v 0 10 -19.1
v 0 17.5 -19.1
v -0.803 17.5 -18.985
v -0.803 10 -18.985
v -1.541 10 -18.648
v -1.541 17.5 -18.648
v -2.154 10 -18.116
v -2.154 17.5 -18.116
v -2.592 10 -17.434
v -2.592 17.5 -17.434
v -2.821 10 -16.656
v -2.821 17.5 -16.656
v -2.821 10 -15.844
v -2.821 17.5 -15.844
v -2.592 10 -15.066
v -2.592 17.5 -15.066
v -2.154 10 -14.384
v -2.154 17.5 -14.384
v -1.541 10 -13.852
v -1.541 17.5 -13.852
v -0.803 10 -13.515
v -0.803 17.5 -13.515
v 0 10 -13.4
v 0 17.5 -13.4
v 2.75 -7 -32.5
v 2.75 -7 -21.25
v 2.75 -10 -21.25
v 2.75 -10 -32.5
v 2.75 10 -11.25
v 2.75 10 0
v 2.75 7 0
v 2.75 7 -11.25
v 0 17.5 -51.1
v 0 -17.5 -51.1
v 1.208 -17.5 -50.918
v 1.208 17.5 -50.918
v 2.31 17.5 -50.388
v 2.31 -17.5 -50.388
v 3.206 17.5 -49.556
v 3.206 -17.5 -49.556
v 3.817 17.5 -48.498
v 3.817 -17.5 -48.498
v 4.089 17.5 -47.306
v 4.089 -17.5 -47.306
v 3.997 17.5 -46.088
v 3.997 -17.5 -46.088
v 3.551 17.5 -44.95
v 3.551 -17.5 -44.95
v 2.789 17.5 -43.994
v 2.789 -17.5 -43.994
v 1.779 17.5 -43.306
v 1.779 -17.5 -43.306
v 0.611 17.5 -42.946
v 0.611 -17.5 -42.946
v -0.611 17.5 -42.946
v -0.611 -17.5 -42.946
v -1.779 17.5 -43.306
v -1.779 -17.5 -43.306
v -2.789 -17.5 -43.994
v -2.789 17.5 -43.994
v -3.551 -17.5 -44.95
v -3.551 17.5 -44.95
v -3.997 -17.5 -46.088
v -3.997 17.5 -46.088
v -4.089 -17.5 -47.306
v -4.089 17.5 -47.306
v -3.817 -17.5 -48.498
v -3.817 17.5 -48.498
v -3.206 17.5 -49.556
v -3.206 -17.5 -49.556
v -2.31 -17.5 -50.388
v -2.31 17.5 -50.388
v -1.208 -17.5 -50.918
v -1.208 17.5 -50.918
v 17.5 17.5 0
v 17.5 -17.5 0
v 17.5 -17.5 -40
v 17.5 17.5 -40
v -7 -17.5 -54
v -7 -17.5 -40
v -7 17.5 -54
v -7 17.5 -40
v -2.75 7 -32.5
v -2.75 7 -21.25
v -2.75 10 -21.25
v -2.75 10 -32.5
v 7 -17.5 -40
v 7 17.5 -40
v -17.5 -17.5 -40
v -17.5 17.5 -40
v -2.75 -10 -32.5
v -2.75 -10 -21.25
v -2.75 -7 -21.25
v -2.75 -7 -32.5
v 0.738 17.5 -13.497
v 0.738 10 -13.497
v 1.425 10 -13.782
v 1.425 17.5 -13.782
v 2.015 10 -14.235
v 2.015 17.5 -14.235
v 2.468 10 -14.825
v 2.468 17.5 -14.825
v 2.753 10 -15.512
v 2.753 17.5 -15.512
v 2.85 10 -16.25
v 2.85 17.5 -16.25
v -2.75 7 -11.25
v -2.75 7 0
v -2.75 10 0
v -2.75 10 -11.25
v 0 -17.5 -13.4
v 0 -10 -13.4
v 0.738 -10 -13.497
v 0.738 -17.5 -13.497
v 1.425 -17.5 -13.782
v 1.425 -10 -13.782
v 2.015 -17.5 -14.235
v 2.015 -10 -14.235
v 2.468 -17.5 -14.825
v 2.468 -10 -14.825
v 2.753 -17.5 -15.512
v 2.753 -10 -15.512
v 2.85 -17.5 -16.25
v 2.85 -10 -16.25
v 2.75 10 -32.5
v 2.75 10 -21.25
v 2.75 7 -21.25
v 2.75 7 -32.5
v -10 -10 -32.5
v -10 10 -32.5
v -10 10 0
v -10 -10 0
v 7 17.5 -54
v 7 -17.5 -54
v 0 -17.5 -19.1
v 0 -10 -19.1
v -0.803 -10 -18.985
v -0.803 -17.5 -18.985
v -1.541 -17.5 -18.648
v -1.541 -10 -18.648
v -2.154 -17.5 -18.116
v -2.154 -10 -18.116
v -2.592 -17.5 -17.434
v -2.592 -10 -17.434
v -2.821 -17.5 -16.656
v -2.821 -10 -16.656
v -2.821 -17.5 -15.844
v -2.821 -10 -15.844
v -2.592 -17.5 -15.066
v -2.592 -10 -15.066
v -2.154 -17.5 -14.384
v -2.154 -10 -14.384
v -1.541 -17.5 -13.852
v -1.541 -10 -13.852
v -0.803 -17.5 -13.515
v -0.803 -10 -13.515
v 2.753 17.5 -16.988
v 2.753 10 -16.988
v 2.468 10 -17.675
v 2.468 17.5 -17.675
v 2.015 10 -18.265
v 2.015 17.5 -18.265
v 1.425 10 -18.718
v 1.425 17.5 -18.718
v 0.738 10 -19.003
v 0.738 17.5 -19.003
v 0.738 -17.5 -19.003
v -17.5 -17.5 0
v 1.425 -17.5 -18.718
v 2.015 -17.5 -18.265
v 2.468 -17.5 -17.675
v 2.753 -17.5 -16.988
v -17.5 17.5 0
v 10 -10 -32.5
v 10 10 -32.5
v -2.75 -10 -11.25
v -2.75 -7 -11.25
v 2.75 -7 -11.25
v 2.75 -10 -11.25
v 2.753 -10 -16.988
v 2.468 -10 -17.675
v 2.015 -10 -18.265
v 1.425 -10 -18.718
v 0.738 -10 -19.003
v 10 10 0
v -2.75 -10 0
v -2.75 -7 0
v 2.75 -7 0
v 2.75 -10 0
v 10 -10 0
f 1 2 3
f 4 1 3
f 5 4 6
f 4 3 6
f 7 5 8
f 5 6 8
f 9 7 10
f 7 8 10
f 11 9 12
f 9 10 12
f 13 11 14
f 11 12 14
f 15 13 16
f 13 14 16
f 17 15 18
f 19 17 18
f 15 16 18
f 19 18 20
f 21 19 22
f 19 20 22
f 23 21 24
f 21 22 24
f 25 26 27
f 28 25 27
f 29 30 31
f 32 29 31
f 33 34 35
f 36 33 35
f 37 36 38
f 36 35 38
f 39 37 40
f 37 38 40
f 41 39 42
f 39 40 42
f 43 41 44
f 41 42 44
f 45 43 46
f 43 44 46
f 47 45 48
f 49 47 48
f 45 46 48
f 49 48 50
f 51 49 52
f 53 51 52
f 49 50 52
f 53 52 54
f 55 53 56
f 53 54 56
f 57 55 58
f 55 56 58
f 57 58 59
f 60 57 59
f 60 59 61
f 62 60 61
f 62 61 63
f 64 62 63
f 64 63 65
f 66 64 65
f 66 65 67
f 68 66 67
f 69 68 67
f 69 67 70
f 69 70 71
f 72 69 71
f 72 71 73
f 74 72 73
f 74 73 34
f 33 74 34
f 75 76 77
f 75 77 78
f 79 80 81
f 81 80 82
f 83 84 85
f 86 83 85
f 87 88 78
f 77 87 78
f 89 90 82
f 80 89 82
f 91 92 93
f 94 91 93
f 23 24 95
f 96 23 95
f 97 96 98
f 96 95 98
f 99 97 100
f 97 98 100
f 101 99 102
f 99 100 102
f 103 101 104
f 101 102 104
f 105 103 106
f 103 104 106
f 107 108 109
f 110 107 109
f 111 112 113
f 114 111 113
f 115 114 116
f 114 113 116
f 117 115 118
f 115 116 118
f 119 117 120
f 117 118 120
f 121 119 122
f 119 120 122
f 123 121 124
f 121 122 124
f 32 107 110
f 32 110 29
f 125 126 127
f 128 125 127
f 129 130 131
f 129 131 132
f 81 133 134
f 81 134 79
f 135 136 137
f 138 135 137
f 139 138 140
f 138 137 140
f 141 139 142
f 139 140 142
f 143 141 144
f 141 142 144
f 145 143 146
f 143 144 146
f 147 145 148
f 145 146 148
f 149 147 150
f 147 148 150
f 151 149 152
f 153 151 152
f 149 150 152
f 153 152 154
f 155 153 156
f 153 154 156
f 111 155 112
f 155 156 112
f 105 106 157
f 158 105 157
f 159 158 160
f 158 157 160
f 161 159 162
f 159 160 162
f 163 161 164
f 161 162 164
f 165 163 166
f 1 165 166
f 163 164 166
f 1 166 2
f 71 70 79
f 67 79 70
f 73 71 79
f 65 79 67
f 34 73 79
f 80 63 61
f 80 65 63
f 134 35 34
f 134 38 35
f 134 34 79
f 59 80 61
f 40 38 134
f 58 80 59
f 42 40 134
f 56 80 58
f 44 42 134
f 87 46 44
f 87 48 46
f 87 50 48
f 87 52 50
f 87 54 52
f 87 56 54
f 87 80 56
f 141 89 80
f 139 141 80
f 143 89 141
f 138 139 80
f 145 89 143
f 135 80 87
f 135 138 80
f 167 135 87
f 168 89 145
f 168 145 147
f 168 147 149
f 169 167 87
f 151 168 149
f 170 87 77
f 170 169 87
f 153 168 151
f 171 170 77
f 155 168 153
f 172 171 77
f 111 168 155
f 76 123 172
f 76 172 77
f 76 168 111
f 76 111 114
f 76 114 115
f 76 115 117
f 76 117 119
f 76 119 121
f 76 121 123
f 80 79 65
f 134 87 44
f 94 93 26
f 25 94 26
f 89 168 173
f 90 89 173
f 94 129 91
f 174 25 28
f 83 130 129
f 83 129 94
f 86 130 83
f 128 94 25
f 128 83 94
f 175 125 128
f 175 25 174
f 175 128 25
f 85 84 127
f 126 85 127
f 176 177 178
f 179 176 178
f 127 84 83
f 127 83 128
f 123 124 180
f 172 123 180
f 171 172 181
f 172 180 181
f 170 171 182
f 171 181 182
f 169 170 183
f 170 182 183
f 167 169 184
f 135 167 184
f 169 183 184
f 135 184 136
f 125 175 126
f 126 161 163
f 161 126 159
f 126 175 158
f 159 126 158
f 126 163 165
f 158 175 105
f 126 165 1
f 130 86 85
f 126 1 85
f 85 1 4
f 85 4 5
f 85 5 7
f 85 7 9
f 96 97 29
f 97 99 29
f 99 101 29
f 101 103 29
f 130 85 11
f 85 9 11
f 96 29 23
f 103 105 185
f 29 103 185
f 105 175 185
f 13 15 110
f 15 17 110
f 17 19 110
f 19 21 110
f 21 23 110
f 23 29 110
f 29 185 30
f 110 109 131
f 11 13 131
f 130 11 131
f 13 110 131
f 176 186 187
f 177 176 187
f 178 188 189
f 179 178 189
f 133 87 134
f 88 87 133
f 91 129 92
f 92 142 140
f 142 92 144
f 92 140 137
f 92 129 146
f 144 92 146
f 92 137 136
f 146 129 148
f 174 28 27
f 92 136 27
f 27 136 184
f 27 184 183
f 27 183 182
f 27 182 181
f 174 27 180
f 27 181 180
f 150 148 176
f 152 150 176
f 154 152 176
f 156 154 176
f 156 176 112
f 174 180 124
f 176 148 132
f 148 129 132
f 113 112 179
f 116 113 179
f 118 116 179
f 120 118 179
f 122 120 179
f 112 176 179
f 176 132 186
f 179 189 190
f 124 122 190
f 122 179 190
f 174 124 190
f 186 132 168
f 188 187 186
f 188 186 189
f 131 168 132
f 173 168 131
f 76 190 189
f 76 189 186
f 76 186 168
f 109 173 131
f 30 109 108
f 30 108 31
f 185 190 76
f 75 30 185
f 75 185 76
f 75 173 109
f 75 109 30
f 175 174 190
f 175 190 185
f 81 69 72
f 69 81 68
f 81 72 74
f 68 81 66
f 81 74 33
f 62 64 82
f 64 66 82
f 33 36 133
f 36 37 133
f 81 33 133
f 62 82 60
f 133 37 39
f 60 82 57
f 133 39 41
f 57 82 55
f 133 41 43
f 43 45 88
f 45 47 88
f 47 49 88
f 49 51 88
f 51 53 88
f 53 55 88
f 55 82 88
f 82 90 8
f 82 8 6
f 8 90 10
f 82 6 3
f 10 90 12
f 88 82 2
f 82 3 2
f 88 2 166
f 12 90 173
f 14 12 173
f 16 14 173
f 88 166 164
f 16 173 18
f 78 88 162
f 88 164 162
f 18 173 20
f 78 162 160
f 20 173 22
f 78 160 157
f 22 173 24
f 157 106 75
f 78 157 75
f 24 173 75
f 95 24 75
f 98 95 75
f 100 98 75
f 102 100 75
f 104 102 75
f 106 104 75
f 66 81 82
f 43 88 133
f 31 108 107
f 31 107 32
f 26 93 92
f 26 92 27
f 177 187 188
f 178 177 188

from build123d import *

# Parameters (mm, degrees)
SKETCH_1_W          = 35
SKETCH_1_H          = 35
EXTRUDE_1_DEPTH     = 40
SKETCH_2_W          = 5.5
SKETCH_2_H          = 5.5
SKETCH_2_H_2        = 4.25
SKETCH_2_W_2        = 4.25
SKETCH_2_W_3        = 3
CUT_EXTRUDE_4_DEPTH = 32.5
SKETCH_3_W          = 5.5
SKETCH_3_H          = 10
CUT_EXTRUDE_5_DEPTH = 3
SKETCH_4_W          = 5.5
SKETCH_4_H          = 10
CUT_EXTRUDE_6_DEPTH = 3
CUT_EXTRUDE_7_DEPTH = 56.957573214
SKETCH_6_W          = 14
SKETCH_6_H          = 35
EXTRUDE_2_DEPTH     = 14
CUT_EXTRUDE_8_DEPTH = 67.687705014
SKETCH_13_R         = 4.1
CUT_EXTRUDE_9_DEPTH = 67.687705014


with BuildPart() as part:
    # Эскиз1 → Бобышка-Вытянуть1 (new body)
    with BuildSketch(Plane.XY):
        Rectangle(SKETCH_1_W, SKETCH_1_H)
    extrude(amount=-EXTRUDE_1_DEPTH)

    # Эскиз2 → Вырез-Вытянуть4 (cut)
    with BuildSketch(Plane.XY):
        Rectangle(SKETCH_2_W, SKETCH_2_H)
        with Locations((0, 4.875)):
            Rectangle(SKETCH_2_W, SKETCH_2_H_2)
        with Locations((0, -4.875)):
            Rectangle(SKETCH_2_W, SKETCH_2_H_2)
        Polygon((10, -10), (10, -2.75), (7, -2.75), (2.75, -2.75), (2.75, -7), (2.75, -10), align=None)
        Polygon((10, 10), (2.75, 10), (2.75, 7), (2.75, 2.75), (7, 2.75), (10, 2.75), align=None)
        Polygon((-2.75, 10), (-10, 10), (-10, 2.75), (-7, 2.75), (-2.75, 2.75), (-2.75, 7), align=None)
        Polygon((-7, -2.75), (-10, -2.75), (-10, -10), (-2.75, -10), (-2.75, -7), (-2.75, -2.75), align=None)
        with Locations((-4.875, 0)):
            Rectangle(SKETCH_2_W_2, SKETCH_2_H)
        with Locations((-8.5, 0)):
            Rectangle(SKETCH_2_W_3, SKETCH_2_H)
        with Locations((4.875, 0)):
            Rectangle(SKETCH_2_W_2, SKETCH_2_H)
        with Locations((8.5, 0)):
            Rectangle(SKETCH_2_W_3, SKETCH_2_H)
    extrude(amount=-CUT_EXTRUDE_4_DEPTH, mode=Mode.SUBTRACT)

    # Эскиз3 → Вырез-Вытянуть5 (cut)
    with BuildSketch(Plane.XZ.offset(-7)):
        with Locations((0, -16.25)):
            Rectangle(SKETCH_3_W, SKETCH_3_H)
    extrude(amount=-CUT_EXTRUDE_5_DEPTH, mode=Mode.SUBTRACT)

    # Эскиз4 → Вырез-Вытянуть6 (cut)
    with BuildSketch(Plane(origin=(0, -7, 0), x_dir=(1, 0, 0), z_dir=(0, 1, 0))):
        with Locations((0, 16.25)):
            Rectangle(SKETCH_4_W, SKETCH_4_H)
    extrude(amount=-CUT_EXTRUDE_6_DEPTH, mode=Mode.SUBTRACT)

    # Эскиз5 → Вырез-Вытянуть7 (cut, through all)
    with BuildSketch(Plane(origin=(0, 17.5, 0), x_dir=(1, 0, 0), z_dir=(0, 1, 0))):
        with BuildLine():
            ThreePointArc((0, 19.1), (-2.85, 16.25), (0, 13.4))
            Line((0, 13.4), (0, 19.1))
        make_face()
        with BuildLine():
            Line((0, 19.1), (0, 13.4))
            ThreePointArc((0, 13.4), (2.015254326, 14.234745674), (2.85, 16.25))
            ThreePointArc((2.85, 16.25), (2.015254326, 18.265254326), (0, 19.1))
        make_face()
    extrude(amount=-CUT_EXTRUDE_7_DEPTH, mode=Mode.SUBTRACT)

    # Эскиз6 → Бобышка-Вытянуть2 (add)
    with BuildSketch(Plane(origin=(0, 0, -40), x_dir=(-1, 0, 0), z_dir=(0, 0, -1))):
        Rectangle(SKETCH_6_W, SKETCH_6_H)
    extrude(amount=EXTRUDE_2_DEPTH)

    # Эскиз7 → Вырез-Вытянуть8 (cut, through all)
    with BuildSketch(Plane(origin=(0, 17.5, 0), x_dir=(1, 0, 0), z_dir=(0, 1, 0))):
        with BuildLine():
            ThreePointArc((0, 51.03), (-4.03, 47), (0, 42.97))
            Line((0, 42.97), (0, 51.03))
        make_face()
        with BuildLine():
            Line((0, 51.03), (0, 42.97))
            ThreePointArc((0, 42.97), (2.849640328, 44.150359672), (4.03, 47))
            ThreePointArc((4.03, 47), (2.849640328, 49.849640328), (0, 51.03))
        make_face()
    extrude(amount=-CUT_EXTRUDE_8_DEPTH, mode=Mode.SUBTRACT)

    # Эскиз13 → Вырез-Вытянуть9 (cut, through all)
    with BuildSketch(Plane.XZ.offset(17.5)):
        with Locations(Location((0, -47, 0), (0, 0, 270))):
            Circle(SKETCH_13_R)
    extrude(amount=-CUT_EXTRUDE_9_DEPTH, mode=Mode.SUBTRACT)


solid = part.part
